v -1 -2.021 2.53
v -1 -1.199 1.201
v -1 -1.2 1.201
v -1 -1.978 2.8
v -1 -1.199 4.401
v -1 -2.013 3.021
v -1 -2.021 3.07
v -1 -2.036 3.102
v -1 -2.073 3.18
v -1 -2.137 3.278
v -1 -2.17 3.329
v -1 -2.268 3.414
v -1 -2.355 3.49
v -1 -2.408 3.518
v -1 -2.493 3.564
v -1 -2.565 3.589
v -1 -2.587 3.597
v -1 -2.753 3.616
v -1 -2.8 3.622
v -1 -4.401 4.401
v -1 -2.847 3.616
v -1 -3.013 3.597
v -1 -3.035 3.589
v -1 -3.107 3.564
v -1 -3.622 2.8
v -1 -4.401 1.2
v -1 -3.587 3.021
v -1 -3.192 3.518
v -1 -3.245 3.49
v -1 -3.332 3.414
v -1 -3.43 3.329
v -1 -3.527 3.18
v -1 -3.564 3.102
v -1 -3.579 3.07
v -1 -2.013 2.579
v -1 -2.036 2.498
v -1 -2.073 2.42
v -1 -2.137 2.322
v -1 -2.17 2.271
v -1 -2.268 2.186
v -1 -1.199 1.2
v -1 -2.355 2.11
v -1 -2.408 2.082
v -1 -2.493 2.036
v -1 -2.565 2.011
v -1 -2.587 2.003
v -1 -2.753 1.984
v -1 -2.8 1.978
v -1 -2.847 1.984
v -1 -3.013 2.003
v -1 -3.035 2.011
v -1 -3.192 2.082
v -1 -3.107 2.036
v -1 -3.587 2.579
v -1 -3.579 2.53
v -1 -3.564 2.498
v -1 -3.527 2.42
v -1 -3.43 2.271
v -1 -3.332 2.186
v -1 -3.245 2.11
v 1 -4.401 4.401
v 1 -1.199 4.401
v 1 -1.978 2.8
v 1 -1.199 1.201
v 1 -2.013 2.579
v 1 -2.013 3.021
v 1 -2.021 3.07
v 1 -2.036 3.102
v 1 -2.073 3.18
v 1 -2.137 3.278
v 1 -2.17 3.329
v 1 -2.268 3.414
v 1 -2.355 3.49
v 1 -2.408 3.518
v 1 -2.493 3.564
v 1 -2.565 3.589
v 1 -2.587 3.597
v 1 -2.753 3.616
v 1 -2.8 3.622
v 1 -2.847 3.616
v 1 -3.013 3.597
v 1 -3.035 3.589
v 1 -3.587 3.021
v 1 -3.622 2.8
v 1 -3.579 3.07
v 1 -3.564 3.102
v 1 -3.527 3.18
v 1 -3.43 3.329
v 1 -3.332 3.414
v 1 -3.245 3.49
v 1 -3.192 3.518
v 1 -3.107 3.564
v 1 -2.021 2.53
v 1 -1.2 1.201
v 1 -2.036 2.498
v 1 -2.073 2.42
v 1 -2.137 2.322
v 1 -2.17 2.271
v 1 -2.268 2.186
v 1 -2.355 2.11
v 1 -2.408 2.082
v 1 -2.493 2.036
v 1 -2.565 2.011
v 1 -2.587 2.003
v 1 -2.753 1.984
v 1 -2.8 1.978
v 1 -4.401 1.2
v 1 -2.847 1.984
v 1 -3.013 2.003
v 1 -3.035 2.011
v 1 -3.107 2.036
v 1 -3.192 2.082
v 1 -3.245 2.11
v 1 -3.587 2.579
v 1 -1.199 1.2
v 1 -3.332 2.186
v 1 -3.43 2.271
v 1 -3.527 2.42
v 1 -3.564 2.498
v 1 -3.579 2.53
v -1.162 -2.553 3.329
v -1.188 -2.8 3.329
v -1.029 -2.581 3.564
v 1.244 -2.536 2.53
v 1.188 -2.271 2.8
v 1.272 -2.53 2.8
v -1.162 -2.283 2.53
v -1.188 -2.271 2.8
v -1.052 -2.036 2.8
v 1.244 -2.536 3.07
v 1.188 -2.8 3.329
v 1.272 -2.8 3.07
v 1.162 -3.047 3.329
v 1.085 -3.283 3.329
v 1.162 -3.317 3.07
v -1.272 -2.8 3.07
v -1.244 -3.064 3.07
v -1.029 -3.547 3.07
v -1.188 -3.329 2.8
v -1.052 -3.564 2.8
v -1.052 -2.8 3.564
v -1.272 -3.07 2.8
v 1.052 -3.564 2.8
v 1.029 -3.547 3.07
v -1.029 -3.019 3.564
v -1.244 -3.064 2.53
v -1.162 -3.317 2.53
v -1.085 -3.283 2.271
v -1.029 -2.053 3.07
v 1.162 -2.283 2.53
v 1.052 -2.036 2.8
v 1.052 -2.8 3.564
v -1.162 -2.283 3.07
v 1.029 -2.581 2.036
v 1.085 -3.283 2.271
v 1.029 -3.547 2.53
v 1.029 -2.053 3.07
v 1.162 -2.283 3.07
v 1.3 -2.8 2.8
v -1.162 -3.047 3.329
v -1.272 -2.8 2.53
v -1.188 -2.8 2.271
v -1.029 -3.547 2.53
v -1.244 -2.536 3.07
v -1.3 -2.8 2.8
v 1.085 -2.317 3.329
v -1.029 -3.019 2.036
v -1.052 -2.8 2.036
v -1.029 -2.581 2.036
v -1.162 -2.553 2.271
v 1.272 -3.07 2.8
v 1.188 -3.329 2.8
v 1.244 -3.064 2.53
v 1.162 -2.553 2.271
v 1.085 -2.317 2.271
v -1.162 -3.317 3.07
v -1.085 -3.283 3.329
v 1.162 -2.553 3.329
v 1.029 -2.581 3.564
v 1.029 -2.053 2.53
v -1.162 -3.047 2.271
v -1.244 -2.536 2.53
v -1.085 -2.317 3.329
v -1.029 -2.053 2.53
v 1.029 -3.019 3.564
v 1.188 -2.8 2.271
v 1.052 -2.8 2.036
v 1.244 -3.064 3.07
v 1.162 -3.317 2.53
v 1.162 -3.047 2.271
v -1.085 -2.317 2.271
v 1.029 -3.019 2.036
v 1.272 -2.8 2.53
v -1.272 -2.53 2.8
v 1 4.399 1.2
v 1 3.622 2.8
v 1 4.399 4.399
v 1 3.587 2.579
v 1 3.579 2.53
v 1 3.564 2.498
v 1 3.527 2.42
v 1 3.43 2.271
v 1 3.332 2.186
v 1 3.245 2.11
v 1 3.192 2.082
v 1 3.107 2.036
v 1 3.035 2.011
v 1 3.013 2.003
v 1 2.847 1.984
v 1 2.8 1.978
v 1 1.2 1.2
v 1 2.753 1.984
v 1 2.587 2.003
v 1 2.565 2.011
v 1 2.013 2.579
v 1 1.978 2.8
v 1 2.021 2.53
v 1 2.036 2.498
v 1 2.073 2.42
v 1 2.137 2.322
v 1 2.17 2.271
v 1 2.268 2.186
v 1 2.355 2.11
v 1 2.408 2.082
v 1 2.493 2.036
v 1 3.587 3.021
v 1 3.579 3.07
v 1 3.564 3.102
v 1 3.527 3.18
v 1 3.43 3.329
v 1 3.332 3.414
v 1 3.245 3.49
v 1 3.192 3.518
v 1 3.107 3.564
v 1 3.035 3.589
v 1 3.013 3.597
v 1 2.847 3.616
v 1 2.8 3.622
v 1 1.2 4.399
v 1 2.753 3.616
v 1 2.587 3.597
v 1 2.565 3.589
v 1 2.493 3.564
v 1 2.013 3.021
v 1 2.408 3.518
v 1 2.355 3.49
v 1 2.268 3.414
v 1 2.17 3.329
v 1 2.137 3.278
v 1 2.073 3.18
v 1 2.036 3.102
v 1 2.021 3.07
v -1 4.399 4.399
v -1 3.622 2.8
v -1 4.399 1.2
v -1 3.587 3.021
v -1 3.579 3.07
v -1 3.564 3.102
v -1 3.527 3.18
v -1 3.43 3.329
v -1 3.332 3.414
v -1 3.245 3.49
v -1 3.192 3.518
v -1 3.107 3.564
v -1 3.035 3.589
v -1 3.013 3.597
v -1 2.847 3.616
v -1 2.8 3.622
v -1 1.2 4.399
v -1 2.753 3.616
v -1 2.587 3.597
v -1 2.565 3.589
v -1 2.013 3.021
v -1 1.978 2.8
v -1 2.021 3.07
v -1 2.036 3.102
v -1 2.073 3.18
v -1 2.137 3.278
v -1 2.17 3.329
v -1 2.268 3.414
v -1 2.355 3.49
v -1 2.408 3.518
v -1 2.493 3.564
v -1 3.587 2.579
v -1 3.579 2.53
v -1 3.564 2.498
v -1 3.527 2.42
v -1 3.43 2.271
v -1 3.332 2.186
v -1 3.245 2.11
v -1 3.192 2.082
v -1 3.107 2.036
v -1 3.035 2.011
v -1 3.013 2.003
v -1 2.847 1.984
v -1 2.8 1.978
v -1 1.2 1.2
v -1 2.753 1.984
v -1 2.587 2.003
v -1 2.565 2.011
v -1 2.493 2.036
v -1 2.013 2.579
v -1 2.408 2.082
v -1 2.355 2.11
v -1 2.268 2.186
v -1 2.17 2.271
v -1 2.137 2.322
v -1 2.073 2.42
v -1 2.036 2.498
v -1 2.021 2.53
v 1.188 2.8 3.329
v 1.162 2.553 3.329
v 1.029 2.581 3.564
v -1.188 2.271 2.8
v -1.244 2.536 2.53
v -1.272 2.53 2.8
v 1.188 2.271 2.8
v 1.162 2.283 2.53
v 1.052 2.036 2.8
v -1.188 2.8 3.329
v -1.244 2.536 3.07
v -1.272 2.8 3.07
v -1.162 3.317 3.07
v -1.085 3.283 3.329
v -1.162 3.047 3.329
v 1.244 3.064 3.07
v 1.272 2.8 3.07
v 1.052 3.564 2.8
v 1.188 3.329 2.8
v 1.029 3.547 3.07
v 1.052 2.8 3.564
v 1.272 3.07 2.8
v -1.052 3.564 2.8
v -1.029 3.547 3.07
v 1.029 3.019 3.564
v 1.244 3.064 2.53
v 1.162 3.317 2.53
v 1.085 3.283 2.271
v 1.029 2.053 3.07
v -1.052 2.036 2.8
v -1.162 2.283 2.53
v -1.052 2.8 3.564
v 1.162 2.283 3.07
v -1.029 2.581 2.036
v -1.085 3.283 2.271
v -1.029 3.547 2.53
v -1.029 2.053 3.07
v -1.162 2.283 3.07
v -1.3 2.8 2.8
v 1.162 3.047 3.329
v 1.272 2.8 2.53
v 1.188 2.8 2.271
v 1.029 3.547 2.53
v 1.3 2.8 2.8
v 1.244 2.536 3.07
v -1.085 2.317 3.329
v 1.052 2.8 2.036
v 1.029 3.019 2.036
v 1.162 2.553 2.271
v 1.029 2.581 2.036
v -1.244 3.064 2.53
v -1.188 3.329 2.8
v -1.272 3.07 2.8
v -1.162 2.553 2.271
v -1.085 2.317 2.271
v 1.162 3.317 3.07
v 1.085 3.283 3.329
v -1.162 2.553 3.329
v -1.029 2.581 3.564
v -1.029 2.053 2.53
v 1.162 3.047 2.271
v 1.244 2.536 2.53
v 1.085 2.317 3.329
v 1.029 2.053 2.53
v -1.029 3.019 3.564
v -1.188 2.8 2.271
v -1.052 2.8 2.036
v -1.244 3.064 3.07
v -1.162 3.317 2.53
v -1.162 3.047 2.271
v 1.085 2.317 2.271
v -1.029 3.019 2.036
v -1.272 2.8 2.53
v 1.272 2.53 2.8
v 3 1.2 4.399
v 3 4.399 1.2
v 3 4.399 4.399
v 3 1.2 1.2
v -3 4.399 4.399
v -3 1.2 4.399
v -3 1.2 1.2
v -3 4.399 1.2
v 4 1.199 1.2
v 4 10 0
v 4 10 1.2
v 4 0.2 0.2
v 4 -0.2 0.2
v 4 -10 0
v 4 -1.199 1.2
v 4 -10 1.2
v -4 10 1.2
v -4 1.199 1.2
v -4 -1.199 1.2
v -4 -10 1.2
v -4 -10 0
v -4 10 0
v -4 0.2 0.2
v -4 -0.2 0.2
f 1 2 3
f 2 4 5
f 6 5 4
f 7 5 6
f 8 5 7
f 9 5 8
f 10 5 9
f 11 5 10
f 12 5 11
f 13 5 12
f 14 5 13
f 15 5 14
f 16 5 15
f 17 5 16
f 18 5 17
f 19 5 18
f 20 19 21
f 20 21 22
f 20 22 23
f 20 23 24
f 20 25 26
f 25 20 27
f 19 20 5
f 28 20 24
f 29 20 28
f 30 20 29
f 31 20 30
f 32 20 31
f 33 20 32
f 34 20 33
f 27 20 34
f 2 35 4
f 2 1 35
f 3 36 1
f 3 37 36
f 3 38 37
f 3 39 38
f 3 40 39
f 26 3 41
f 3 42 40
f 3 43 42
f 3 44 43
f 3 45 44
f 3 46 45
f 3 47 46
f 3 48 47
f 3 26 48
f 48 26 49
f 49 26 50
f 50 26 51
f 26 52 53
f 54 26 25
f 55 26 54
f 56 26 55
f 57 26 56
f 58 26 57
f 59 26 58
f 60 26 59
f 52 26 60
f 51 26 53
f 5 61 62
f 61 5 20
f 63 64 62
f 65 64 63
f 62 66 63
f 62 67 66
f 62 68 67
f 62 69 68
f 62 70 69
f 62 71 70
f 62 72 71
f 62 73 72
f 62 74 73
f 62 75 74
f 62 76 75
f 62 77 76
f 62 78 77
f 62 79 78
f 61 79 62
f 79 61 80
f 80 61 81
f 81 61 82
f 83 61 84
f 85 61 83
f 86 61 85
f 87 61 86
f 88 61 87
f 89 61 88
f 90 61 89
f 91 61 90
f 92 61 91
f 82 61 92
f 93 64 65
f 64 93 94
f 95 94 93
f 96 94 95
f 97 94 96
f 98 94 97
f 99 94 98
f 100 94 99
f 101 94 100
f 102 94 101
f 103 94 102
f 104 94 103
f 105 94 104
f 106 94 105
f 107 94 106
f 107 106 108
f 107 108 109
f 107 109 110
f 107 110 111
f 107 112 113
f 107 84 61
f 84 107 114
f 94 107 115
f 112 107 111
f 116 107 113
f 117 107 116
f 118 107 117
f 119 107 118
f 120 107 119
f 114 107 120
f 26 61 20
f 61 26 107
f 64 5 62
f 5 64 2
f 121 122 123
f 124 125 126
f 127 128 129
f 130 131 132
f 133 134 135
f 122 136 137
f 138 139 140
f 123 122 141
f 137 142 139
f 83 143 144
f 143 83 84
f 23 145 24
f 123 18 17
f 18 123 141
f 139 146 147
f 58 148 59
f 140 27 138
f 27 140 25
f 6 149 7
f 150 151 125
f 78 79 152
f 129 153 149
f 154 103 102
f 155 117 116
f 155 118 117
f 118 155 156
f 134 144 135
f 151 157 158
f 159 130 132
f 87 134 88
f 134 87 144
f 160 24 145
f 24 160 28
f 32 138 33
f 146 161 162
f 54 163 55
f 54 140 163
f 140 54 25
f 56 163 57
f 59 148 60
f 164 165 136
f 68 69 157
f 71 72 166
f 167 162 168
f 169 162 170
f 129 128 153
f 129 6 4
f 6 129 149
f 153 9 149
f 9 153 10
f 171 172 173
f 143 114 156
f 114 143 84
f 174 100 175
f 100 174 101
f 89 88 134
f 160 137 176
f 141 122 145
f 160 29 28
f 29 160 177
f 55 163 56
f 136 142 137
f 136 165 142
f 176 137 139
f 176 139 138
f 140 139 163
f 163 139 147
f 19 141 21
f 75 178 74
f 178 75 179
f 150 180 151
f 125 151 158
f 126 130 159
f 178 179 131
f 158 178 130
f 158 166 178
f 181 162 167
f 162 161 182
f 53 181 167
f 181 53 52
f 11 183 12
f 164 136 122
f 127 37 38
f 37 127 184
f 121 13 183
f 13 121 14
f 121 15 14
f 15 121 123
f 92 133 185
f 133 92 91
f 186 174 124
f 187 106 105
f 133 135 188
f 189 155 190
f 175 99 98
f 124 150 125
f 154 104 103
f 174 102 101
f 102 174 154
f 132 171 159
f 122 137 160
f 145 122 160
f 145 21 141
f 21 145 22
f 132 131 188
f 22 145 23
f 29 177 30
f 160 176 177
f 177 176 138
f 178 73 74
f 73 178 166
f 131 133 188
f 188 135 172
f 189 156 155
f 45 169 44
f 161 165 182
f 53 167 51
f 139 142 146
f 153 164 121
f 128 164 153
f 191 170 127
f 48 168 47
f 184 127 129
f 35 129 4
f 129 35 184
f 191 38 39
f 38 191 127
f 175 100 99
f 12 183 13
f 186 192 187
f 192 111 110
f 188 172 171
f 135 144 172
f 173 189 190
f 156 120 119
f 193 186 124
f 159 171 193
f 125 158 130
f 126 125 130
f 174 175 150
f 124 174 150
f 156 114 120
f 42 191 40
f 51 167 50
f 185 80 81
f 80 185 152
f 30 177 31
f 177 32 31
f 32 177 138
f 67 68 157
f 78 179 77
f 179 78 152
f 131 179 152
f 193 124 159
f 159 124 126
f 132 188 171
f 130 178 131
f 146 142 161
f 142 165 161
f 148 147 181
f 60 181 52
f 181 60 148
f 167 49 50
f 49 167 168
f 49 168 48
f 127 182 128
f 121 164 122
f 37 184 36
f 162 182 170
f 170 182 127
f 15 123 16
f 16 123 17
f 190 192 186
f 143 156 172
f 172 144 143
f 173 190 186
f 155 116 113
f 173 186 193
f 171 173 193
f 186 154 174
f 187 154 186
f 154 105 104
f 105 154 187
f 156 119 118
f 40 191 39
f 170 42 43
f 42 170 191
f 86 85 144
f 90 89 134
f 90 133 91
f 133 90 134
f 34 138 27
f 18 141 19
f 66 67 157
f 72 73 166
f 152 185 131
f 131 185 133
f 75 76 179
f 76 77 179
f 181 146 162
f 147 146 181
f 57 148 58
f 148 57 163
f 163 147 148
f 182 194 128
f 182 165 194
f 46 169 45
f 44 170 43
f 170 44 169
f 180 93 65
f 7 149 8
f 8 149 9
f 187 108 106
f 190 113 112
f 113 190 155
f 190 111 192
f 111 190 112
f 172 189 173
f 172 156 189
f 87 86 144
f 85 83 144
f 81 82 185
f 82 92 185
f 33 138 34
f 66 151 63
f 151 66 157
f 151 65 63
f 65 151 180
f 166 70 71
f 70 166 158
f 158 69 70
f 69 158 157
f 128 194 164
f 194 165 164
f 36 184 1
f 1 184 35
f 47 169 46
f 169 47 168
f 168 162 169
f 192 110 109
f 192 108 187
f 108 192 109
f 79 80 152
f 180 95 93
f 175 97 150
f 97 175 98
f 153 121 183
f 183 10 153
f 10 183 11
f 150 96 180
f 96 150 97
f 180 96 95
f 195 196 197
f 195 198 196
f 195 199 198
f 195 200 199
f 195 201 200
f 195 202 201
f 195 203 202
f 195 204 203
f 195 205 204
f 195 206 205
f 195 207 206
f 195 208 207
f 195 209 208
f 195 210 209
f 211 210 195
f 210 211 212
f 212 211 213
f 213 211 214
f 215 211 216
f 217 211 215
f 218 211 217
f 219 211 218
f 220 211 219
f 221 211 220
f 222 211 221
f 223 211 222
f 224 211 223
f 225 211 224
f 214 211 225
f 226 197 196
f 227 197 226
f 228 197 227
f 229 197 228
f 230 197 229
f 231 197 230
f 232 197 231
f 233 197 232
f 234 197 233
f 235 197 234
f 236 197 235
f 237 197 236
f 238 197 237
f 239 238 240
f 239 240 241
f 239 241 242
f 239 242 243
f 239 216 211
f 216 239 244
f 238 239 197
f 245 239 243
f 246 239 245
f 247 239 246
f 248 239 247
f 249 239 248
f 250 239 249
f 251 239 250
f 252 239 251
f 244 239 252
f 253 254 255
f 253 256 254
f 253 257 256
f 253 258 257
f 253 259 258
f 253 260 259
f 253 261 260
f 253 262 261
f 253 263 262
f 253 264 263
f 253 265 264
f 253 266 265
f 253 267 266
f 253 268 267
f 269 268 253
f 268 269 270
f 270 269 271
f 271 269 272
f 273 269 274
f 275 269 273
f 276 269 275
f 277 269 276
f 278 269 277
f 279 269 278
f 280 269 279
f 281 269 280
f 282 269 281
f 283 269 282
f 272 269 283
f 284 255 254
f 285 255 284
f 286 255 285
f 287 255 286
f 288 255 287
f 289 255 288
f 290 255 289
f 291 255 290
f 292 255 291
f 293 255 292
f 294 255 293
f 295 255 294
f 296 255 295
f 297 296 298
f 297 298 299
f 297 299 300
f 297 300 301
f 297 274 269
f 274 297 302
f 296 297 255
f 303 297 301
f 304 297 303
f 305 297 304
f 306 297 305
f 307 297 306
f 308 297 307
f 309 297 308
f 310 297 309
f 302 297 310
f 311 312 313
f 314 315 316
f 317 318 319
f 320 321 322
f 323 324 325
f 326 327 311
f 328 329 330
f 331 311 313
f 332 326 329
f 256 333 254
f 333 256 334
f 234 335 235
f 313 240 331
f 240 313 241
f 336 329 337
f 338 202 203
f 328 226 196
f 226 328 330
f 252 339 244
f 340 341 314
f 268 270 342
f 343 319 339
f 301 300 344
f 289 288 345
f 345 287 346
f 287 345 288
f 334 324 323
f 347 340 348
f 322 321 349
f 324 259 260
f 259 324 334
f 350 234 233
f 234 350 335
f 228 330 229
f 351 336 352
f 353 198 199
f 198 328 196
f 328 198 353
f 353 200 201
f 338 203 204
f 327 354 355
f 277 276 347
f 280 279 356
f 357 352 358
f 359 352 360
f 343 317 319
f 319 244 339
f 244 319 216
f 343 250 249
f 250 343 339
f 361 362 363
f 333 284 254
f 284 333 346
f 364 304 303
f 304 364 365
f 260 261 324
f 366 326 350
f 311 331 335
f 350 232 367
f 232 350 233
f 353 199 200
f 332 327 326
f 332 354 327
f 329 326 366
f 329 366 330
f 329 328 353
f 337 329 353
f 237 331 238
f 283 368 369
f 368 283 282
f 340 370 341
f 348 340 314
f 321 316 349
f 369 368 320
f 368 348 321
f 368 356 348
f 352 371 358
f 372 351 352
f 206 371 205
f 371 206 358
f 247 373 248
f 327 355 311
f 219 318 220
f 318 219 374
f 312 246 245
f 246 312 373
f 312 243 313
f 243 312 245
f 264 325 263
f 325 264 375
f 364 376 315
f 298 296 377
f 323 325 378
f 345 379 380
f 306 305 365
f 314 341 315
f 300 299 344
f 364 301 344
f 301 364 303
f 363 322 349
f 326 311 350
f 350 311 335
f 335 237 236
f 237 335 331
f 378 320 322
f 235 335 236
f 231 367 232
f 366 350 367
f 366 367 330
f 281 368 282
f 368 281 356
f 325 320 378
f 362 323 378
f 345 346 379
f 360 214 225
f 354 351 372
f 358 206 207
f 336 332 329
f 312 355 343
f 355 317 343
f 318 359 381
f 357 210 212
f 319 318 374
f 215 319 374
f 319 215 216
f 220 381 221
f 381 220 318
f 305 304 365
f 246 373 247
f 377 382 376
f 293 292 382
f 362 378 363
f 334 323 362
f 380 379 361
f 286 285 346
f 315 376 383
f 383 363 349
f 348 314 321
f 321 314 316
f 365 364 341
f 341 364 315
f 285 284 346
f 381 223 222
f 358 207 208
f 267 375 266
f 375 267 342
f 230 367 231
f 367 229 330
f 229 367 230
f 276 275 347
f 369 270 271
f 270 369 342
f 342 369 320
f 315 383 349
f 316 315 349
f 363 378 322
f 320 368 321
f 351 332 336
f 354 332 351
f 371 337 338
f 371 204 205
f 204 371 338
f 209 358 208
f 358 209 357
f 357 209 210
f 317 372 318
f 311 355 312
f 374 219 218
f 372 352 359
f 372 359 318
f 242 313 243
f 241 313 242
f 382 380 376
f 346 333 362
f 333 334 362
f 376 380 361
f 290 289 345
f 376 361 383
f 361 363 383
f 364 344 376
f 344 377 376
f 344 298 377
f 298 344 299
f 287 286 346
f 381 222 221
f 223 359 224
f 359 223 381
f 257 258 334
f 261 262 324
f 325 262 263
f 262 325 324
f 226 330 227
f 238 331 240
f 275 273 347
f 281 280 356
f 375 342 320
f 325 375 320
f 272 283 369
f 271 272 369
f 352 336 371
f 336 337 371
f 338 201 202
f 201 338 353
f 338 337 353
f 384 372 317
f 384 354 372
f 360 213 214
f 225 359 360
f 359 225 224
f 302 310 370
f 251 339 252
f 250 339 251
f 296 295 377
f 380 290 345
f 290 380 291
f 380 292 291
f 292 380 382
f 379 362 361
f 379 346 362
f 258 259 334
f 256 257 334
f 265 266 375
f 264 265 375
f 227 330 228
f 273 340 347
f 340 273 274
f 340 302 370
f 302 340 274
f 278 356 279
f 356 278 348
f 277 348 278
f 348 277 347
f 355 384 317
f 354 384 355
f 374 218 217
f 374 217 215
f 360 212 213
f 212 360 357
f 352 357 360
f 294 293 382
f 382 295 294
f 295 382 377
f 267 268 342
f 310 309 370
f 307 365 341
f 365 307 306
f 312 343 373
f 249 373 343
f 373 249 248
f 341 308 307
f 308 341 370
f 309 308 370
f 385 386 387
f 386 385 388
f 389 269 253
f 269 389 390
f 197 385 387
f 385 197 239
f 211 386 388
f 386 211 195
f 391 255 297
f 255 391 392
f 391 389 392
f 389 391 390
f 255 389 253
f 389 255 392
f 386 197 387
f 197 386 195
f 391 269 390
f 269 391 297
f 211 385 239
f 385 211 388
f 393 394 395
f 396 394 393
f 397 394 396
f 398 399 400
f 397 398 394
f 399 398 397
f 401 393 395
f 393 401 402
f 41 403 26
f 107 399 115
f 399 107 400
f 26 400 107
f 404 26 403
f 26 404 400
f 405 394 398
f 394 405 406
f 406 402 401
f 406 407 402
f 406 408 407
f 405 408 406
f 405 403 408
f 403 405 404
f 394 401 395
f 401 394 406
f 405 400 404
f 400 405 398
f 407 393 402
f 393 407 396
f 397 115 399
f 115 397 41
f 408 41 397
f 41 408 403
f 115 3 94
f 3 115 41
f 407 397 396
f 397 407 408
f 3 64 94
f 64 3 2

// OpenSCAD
//
// A click-together joint, intended to hold together the two sides of a living hinge
//
// parameters:
//   size:       the height and depth of the pegs
//   width:      the width of the pegs
//   thickness:  thickness of the panel on which the joint will sit
//   offset:     allows for additional lateral displacement to move the joint away from the hinge (NB: affects height)
//   plug:       whether to include the male (single post) plug
//   socket:     whether to include the female (double post) socket
//   reverse:    whether to reverse the relative position of plug and socket
//

module HingeJoint(size = 3.2, width = 2.0, thickness = 1.2, offset = 0, plug = true, socket = true, reverse = false) {

	// for avoiding coincident planes
	eps = 0.001;

	// base component, centered on origin, sat on Z plane
	module _plug() {
		translate([-width / 2, -eps, -eps]) scale([width, size + 2 * eps, size + offset + 2 * eps]) cube();
		translate([0, size / 2, offset + size / 2]) sphere(d = width + 0.6, $fs = 0.1);
	}

	// base component, centered on origin, sat on Z plane
	module _socket() {
		difference() {
			translate([-3 * width / 2, 0, 0]) scale([3 * width, size - eps, size + offset - eps]) cube();
			_plug();
		}
	};

	// plug component moved away from the joint
	module Plug() {
		translate([0, thickness + offset, thickness]) _plug();
	}

	// socket component moved away from the joint in the opposite direction
	module Socket() {
		rotate([0, 0, 180]) {
			translate([0, thickness + offset, thickness]) _socket();
		}
	}
 
	rotate([0, 0, reverse ? 0 : 180]) {
		if (plug) {
			Plug();
		}
		if (socket) {
			Socket();
		}
	}
};

//
// A wedge shaped piece oriented along the X axis and centered on the origin,
// intended to be subtracted from other parts to allow a fold to be made along it.
//
// parameters:
//	 width:      the total width of the cut
//	 thickness:  thickness of the panel through which the cut will be made
//	 fold:       how much material to leave at the point of the fold
//

module HingeCut(width = 10, thickness = 1.2, fold = 0.2) {

	// for avoiding coincident planes
	eps = 0.001;
	
	translate([-width / 2, 0, 0])
	rotate([90, 0, 90])
	linear_extrude(height = width)
	polygon([
		[fold, fold],
		[thickness, thickness + eps],
		[-thickness, thickness + eps],
		[-fold, fold]
	]);
};

module _HingeTest(offset = 0, fold = 0.2) {
	t = 1.2;
	difference() {
		union() {
			translate([-4, -10, 0]) cube([8, 20, t]);
			HingeJoint(thickness = t, offset = offset);
		}
		HingeCut(thickness = t, fold = fold);
	}
}

translate([0, 0, 0]) _HingeTest();
